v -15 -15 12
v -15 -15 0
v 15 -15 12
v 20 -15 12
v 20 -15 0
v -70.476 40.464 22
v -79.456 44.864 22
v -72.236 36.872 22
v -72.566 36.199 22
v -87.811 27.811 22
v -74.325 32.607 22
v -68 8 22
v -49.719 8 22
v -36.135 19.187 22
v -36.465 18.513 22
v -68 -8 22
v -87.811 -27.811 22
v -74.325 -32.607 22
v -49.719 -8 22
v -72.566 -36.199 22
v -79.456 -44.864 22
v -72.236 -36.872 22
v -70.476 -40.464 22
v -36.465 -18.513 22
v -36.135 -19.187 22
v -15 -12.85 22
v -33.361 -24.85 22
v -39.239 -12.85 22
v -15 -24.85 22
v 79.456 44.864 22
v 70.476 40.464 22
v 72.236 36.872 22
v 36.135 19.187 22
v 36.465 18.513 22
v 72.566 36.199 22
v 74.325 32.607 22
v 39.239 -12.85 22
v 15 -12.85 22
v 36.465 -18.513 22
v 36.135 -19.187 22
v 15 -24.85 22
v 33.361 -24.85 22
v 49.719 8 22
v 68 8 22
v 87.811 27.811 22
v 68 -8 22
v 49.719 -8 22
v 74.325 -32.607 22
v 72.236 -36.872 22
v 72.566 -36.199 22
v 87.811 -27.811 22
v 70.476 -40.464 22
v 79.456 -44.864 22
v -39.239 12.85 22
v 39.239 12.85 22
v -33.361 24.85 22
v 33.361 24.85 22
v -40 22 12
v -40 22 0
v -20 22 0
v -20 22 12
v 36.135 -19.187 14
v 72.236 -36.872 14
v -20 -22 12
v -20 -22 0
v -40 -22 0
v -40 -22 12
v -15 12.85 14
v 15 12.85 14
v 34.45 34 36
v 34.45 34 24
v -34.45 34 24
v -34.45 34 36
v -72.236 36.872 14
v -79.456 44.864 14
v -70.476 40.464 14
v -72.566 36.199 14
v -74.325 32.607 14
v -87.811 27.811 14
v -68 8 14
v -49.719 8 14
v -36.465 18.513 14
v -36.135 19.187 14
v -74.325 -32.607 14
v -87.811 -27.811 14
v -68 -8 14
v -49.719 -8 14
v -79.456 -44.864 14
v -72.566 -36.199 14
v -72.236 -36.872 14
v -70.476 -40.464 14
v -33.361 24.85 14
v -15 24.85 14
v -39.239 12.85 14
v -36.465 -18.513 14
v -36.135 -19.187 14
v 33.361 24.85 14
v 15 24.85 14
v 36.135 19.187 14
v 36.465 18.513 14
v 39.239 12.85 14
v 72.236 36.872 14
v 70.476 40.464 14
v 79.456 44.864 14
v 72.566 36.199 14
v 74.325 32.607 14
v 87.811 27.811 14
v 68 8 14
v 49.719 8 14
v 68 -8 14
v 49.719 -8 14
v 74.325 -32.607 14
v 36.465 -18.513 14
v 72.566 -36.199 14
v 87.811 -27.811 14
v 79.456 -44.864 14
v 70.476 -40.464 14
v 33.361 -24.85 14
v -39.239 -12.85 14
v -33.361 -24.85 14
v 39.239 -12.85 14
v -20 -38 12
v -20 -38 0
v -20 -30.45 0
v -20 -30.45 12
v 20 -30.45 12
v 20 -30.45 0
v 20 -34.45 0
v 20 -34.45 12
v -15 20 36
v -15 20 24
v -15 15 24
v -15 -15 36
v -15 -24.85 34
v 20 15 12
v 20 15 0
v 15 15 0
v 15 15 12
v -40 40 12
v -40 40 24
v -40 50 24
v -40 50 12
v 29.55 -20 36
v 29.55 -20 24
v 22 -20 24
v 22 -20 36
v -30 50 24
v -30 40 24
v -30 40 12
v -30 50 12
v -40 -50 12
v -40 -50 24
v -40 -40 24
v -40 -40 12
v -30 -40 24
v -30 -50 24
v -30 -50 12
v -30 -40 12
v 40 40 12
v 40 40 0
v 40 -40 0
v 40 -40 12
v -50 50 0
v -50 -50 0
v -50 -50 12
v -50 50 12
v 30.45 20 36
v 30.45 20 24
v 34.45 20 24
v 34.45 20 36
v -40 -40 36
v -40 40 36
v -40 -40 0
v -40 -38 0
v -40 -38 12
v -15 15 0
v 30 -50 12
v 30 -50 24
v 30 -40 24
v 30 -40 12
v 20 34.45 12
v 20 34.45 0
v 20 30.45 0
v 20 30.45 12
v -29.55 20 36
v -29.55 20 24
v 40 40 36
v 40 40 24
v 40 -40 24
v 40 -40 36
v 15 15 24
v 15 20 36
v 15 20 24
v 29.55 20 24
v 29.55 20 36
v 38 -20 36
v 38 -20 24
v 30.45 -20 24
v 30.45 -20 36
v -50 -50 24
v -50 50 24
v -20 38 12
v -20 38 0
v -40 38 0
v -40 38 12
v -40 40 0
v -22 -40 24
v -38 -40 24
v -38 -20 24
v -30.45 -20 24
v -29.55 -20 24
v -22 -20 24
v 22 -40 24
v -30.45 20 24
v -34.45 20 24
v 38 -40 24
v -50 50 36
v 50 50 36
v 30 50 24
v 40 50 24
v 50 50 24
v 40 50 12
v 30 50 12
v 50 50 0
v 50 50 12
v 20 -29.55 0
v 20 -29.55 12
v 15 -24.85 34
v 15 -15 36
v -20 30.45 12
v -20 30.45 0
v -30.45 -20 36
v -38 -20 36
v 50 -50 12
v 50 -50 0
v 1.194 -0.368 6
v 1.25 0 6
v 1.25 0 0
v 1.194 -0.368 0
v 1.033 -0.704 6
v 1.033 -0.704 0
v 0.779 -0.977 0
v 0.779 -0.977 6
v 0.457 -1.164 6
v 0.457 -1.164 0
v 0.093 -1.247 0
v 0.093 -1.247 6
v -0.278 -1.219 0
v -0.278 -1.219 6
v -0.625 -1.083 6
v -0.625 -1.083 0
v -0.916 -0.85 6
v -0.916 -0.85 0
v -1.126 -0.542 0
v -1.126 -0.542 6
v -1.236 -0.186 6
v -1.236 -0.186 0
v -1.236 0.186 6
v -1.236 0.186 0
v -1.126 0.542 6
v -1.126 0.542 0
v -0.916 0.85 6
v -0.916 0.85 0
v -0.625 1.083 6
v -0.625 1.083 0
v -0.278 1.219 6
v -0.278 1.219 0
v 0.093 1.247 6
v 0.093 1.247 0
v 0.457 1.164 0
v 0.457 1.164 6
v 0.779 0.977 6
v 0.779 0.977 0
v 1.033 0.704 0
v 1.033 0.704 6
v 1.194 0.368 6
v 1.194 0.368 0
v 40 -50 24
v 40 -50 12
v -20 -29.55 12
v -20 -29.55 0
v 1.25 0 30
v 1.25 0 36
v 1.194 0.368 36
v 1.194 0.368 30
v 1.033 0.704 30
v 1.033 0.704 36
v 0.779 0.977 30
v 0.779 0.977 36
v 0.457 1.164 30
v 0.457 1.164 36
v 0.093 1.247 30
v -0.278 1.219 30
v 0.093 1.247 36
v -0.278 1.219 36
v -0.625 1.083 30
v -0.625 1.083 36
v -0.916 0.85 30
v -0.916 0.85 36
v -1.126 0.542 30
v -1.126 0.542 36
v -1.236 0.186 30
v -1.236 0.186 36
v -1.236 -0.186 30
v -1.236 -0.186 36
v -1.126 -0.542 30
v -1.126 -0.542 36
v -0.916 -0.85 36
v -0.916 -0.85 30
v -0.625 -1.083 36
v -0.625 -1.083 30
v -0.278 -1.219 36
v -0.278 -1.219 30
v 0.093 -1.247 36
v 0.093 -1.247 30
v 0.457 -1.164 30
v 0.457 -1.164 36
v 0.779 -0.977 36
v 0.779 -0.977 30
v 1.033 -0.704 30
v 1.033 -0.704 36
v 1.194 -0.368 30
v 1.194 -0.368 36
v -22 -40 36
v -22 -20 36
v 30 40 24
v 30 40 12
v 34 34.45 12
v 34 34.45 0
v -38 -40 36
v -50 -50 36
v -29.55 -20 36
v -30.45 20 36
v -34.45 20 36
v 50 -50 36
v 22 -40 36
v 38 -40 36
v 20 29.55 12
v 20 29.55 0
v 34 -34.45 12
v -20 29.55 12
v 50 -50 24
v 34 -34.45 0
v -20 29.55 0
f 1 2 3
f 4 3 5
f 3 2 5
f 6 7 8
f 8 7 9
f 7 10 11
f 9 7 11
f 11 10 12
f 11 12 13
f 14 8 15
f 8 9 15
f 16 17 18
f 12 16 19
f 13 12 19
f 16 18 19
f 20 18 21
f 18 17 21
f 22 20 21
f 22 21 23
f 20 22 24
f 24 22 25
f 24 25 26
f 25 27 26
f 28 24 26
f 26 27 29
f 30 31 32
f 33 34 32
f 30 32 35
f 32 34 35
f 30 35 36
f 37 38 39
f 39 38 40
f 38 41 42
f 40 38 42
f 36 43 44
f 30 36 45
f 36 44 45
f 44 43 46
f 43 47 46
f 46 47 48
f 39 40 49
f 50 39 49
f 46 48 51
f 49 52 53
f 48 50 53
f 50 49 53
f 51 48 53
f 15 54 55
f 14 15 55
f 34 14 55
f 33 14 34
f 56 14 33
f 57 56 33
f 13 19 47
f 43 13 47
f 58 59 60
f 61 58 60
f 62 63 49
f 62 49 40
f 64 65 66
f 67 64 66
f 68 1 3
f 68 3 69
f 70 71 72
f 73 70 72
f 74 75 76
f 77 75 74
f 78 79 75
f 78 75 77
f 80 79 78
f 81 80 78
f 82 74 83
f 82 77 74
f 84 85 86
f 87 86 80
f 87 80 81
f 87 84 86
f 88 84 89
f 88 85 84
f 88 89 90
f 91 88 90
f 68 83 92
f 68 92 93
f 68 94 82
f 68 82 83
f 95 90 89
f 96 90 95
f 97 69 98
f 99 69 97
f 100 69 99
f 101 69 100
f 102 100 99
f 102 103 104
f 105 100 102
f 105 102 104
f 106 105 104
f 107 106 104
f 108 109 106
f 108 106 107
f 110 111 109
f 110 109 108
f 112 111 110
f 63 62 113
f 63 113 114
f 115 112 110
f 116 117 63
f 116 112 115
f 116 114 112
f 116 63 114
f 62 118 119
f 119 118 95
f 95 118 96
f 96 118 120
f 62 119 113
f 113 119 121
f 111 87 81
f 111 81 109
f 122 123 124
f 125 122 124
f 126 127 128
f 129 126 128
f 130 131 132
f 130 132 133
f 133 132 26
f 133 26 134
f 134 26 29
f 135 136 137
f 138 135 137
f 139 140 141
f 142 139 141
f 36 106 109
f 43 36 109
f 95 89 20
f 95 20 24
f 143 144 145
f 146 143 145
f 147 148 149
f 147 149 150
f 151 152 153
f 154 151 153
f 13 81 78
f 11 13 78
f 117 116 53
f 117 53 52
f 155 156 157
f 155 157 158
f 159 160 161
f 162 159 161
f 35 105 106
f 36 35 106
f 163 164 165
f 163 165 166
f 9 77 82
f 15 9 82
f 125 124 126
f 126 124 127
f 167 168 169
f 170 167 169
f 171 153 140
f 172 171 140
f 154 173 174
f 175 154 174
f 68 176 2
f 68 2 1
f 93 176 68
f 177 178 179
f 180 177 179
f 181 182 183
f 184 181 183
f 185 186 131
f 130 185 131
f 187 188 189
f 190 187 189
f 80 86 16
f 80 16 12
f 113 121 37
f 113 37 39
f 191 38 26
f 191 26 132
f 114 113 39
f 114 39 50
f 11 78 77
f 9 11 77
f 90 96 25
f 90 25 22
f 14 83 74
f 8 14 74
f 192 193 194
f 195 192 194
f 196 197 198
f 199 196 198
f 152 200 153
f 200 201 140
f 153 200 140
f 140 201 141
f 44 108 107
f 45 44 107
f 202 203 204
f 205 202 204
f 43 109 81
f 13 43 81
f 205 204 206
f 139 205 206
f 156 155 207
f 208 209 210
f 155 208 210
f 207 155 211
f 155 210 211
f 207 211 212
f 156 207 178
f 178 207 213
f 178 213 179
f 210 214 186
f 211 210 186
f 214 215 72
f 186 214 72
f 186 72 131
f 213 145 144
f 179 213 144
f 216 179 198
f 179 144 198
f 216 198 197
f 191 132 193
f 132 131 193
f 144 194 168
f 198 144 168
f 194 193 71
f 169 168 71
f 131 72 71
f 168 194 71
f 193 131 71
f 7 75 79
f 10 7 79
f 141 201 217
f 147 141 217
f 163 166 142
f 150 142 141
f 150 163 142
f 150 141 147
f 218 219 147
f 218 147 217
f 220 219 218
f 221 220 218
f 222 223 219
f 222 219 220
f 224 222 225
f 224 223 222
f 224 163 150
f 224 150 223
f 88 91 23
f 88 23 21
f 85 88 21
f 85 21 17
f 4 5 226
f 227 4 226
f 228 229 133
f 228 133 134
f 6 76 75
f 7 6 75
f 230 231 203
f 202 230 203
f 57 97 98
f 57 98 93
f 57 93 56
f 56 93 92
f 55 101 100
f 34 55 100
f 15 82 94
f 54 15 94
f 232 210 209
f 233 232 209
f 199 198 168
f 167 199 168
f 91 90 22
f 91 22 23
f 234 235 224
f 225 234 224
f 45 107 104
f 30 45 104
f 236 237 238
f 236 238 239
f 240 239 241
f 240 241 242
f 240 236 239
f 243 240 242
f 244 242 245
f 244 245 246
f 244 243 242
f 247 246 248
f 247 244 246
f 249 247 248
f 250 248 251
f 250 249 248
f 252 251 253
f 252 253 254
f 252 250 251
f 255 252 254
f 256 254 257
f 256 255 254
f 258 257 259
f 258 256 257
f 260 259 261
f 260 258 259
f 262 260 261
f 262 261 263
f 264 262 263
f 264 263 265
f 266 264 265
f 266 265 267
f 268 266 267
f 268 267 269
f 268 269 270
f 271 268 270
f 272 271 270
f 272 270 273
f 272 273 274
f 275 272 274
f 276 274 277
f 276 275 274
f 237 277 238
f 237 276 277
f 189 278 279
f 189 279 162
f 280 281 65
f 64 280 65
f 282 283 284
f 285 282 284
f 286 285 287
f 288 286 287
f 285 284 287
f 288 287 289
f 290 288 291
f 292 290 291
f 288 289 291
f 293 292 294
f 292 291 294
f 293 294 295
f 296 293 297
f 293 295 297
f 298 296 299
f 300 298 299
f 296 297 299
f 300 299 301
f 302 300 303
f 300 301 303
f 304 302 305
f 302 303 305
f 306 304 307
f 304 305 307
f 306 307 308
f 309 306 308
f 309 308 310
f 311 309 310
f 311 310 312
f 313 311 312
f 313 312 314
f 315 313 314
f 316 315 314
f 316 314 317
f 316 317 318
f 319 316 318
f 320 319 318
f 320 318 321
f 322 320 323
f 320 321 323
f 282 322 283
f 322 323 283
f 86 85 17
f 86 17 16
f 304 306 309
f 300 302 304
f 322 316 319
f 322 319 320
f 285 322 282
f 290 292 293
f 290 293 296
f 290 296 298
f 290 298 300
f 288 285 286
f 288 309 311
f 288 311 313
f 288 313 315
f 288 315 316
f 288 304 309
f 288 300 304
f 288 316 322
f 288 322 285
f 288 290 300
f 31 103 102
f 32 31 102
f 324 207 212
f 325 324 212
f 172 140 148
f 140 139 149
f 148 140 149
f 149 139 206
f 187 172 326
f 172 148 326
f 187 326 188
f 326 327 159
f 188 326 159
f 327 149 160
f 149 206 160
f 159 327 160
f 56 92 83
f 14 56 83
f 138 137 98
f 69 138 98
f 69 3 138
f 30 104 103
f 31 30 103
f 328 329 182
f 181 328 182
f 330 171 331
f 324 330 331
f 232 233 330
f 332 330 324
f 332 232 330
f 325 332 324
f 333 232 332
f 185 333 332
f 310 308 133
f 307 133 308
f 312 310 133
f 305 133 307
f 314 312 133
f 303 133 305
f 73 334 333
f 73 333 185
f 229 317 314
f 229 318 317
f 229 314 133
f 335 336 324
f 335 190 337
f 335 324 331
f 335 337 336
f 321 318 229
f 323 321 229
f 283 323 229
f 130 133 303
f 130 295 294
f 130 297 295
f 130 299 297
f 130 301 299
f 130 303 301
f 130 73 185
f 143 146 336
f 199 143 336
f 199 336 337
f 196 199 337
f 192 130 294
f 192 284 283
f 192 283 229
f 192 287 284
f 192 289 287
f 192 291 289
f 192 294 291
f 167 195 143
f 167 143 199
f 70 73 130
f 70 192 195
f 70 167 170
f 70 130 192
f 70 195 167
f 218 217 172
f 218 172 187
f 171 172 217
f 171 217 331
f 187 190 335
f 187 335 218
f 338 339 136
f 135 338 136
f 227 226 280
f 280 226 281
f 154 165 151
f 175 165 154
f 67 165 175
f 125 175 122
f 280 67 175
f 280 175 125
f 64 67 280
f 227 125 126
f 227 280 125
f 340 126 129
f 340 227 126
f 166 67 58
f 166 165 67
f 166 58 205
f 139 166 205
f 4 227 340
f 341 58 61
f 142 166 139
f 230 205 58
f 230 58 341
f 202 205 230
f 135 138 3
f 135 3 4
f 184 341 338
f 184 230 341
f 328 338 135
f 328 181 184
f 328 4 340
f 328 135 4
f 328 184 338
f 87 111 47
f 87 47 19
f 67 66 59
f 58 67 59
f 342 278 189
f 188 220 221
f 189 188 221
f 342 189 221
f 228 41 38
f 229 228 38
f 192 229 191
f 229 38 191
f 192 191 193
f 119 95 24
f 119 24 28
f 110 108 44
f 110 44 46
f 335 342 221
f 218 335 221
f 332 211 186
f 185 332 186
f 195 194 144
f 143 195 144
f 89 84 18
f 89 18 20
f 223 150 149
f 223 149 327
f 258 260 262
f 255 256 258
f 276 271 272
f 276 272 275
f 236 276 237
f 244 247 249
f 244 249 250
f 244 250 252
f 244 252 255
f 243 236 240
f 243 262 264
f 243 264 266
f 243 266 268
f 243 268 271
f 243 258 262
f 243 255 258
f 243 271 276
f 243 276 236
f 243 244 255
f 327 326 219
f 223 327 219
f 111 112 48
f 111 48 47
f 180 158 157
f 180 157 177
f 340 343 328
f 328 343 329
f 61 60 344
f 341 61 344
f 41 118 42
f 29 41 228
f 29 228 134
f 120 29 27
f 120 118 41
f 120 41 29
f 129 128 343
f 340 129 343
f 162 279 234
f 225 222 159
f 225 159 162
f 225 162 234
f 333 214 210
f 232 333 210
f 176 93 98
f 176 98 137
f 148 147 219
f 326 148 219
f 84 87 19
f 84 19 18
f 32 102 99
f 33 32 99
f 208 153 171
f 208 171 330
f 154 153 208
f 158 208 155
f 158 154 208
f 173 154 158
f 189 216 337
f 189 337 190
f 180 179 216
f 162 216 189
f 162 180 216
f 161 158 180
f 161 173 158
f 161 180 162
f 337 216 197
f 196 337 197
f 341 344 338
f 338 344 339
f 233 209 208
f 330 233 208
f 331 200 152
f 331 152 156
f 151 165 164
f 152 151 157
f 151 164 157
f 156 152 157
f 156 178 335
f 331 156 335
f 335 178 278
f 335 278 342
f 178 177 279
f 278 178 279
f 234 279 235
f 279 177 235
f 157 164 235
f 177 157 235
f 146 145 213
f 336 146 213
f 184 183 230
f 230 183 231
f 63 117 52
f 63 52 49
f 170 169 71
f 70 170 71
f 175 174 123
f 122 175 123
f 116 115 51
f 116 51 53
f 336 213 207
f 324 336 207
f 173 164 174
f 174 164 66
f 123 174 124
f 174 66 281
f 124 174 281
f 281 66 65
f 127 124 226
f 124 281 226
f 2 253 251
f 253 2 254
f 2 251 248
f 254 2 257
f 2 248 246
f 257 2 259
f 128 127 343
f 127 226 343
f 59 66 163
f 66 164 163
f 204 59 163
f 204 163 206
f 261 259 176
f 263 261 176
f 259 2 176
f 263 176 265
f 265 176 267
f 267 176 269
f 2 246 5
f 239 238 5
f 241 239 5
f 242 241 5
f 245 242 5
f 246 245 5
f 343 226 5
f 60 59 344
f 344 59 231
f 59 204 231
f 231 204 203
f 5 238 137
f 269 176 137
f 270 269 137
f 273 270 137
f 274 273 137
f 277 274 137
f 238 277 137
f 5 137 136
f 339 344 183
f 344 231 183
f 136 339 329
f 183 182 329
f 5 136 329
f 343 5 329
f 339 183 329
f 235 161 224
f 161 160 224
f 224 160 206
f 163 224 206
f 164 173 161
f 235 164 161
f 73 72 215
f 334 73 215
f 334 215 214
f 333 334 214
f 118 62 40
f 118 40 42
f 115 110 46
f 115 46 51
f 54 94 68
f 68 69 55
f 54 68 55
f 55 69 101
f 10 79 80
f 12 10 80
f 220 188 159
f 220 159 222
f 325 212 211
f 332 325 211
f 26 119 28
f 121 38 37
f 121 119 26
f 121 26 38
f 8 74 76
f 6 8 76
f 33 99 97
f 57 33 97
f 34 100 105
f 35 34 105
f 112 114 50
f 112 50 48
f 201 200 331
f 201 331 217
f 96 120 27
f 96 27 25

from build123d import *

# Parameters (mm, degrees)
SKETCH1_W           = 100
SKETCH1_H           = 100
BOSS_EXTRUDE1_DEPTH = 12
BOSS_EXTRUDE2_DEPTH = 30
BOSS_EXTRUDE3_DEPTH = 8
BOSS_EXTRUDE4_DEPTH = 30
SKETCH8_W           = 100
SKETCH8_H           = 100
BOSS_EXTRUDE5_DEPTH = 12
SKETCH9_W           = 10
SKETCH9_H           = 10
BOSS_EXTRUDE6_DEPTH = 12
SKETCH19_R          = 1.25
CUT_EXTRUDE3_DEPTH  = 6
CUT_EXTRUDE4_START  = -6
SKETCH20_R          = 1.25
CUT_EXTRUDE4_DEPTH  = 6


with BuildPart() as part:
    # Sketch1 → Boss-Extrude1 (new body)
    with BuildSketch(Plane.XY):
        Rectangle(SKETCH1_W, SKETCH1_H)
        Polygon((-20, -38), (-20, -30.45), (20, -30.45), (20, -34.45), (34, -34.45), (34, 34.45), (20, 34.45), (20, 30.45), (-20, 30.45), (-20, 38), (-40, 38), (-40, 40), (40, 40), (40, -40), (-40, -40), (-40, -38), align=None, mode=Mode.SUBTRACT)
        Polygon((-20, -29.55), (-20, -22), (-40, -22), (-40, 22), (-20, 22), (-20, 29.55), (20, 29.55), (20, 15), (-15, 15), (-15, -15), (20, -15), (20, -29.55), align=None, mode=Mode.SUBTRACT)
    extrude(amount=BOSS_EXTRUDE1_DEPTH)

    # Sketch3 → Boss-Extrude2 (add)
    with BuildSketch(Plane.ZY.offset(15)):
        Polygon((14, 12.85), (14, 24.85), (0, 15), (12, 15), (12, -15), align=None)
    extrude(amount=-BOSS_EXTRUDE2_DEPTH)

    # Sketch4 → Boss-Extrude3 (add)
    with BuildSketch(Plane.XY.offset(14)):
        Polygon((-15, 12.85), (-15, 24.85), (-33.36063033, 24.85), (-36.135022811, 19.186760341), (-72.235731357, 36.872314969), (-70.475974677, 40.464425272), (-79.456250435, 44.863816971), (-87.810556524, 27.810556524), (-68, 8), (-68, 0), (-60, 0), (0, 0), (0, 8), (-49.718758429, 8), (-74.325442414, 32.606683984), (-72.565685734, 36.198794287), (-36.464977189, 18.513239659), (-39.23936967, 12.85), align=None)
        Polygon((15, 24.85), (15, 12.85), (39.23936967, 12.85), (36.464977189, 18.513239659), (72.565685734, 36.198794287), (74.325442414, 32.606683984), (49.718758429, 8), (0, 8), (0, 0), (60, 0), (68, 0), (68, 8), (87.810556524, 27.810556524), (79.456250435, 44.863816971), (70.475974677, 40.464425272), (72.235731357, 36.872314969), (36.135022811, 19.186760341), (33.36063033, 24.85), align=None)
        Polygon((6, 24.85), (0, 24.85), (0, 12.85), (15, 12.85), (15, 24.85), align=None)
        Polygon((0, 24.85), (-6, 24.85), (-15, 24.85), (-15, 12.85), (0, 12.85), align=None)
    boss_extrude3 = extrude(amount=BOSS_EXTRUDE3_DEPTH)

    # Mirror6: Boss-Extrude3 across plane
    add(boss_extrude3.mirror(Plane(origin=(0, 0, 22), x_dir=(0, 0, 1), z_dir=(0, 1, 0))))

    # Sketch7 → Boss-Extrude4 (add)
    with BuildSketch(Plane(origin=(15, 0, 0), x_dir=(0, -1, 0), z_dir=(-1, 0, 0))):
        Polygon((24.85, 22), (12.85, 22), (-15, 24), (15, 24), (15, 36), (24.85, 34), align=None)
    extrude(amount=BOSS_EXTRUDE4_DEPTH)

    # Sketch8 → Boss-Extrude5 (add)
    with BuildSketch(Plane.XY.offset(24)):
        Rectangle(SKETCH8_W, SKETCH8_H)
        Polygon((15, -15), (15, 20), (29.55, 20), (29.55, -20), (22, -20), (22, -40), (-22, -40), (-22, -20), (-29.55, -20), (-29.55, 20), (-15, 20), (-15, -15), align=None, mode=Mode.SUBTRACT)
        Polygon((38, -20), (30.45, -20), (30.45, 20), (34.45, 20), (34.45, 34), (-34.45, 34), (-34.45, 20), (-30.45, 20), (-30.45, -20), (-38, -20), (-38, -40), (-40, -40), (-40, 40), (40, 40), (40, -40), (38, -40), align=None, mode=Mode.SUBTRACT)
    extrude(amount=BOSS_EXTRUDE5_DEPTH)

    # Sketch9 → Boss-Extrude6 (add)
    with BuildSketch(Plane.XY.offset(12)):
        with Locations((35, -45)):
            Rectangle(SKETCH9_W, SKETCH9_H)
        with Locations((-35, -45)):
            Rectangle(SKETCH9_W, SKETCH9_H)
        with Locations((-35, 45)):
            Rectangle(SKETCH9_W, SKETCH9_H)
        with Locations((35, 45)):
            Rectangle(SKETCH9_W, SKETCH9_H)
    extrude(amount=BOSS_EXTRUDE6_DEPTH)

    # Sketch19 → Cut-Extrude3 (cut)
    with BuildSketch(Plane.XY.offset(36)):
        Circle(SKETCH19_R)
    extrude(amount=-CUT_EXTRUDE3_DEPTH, mode=Mode.SUBTRACT)

    # Sketch20 → Cut-Extrude4 (cut)
    with BuildSketch(Plane(origin=(0, 0, 0), x_dir=(-1, 0, 0), z_dir=(0, 0, -1)).offset(CUT_EXTRUDE4_START)):
        with Locations(Location((0, 0, 0), (0, 0, 180))):
            Circle(SKETCH20_R)
    extrude(amount=CUT_EXTRUDE4_DEPTH, mode=Mode.SUBTRACT)


solid = part.part
